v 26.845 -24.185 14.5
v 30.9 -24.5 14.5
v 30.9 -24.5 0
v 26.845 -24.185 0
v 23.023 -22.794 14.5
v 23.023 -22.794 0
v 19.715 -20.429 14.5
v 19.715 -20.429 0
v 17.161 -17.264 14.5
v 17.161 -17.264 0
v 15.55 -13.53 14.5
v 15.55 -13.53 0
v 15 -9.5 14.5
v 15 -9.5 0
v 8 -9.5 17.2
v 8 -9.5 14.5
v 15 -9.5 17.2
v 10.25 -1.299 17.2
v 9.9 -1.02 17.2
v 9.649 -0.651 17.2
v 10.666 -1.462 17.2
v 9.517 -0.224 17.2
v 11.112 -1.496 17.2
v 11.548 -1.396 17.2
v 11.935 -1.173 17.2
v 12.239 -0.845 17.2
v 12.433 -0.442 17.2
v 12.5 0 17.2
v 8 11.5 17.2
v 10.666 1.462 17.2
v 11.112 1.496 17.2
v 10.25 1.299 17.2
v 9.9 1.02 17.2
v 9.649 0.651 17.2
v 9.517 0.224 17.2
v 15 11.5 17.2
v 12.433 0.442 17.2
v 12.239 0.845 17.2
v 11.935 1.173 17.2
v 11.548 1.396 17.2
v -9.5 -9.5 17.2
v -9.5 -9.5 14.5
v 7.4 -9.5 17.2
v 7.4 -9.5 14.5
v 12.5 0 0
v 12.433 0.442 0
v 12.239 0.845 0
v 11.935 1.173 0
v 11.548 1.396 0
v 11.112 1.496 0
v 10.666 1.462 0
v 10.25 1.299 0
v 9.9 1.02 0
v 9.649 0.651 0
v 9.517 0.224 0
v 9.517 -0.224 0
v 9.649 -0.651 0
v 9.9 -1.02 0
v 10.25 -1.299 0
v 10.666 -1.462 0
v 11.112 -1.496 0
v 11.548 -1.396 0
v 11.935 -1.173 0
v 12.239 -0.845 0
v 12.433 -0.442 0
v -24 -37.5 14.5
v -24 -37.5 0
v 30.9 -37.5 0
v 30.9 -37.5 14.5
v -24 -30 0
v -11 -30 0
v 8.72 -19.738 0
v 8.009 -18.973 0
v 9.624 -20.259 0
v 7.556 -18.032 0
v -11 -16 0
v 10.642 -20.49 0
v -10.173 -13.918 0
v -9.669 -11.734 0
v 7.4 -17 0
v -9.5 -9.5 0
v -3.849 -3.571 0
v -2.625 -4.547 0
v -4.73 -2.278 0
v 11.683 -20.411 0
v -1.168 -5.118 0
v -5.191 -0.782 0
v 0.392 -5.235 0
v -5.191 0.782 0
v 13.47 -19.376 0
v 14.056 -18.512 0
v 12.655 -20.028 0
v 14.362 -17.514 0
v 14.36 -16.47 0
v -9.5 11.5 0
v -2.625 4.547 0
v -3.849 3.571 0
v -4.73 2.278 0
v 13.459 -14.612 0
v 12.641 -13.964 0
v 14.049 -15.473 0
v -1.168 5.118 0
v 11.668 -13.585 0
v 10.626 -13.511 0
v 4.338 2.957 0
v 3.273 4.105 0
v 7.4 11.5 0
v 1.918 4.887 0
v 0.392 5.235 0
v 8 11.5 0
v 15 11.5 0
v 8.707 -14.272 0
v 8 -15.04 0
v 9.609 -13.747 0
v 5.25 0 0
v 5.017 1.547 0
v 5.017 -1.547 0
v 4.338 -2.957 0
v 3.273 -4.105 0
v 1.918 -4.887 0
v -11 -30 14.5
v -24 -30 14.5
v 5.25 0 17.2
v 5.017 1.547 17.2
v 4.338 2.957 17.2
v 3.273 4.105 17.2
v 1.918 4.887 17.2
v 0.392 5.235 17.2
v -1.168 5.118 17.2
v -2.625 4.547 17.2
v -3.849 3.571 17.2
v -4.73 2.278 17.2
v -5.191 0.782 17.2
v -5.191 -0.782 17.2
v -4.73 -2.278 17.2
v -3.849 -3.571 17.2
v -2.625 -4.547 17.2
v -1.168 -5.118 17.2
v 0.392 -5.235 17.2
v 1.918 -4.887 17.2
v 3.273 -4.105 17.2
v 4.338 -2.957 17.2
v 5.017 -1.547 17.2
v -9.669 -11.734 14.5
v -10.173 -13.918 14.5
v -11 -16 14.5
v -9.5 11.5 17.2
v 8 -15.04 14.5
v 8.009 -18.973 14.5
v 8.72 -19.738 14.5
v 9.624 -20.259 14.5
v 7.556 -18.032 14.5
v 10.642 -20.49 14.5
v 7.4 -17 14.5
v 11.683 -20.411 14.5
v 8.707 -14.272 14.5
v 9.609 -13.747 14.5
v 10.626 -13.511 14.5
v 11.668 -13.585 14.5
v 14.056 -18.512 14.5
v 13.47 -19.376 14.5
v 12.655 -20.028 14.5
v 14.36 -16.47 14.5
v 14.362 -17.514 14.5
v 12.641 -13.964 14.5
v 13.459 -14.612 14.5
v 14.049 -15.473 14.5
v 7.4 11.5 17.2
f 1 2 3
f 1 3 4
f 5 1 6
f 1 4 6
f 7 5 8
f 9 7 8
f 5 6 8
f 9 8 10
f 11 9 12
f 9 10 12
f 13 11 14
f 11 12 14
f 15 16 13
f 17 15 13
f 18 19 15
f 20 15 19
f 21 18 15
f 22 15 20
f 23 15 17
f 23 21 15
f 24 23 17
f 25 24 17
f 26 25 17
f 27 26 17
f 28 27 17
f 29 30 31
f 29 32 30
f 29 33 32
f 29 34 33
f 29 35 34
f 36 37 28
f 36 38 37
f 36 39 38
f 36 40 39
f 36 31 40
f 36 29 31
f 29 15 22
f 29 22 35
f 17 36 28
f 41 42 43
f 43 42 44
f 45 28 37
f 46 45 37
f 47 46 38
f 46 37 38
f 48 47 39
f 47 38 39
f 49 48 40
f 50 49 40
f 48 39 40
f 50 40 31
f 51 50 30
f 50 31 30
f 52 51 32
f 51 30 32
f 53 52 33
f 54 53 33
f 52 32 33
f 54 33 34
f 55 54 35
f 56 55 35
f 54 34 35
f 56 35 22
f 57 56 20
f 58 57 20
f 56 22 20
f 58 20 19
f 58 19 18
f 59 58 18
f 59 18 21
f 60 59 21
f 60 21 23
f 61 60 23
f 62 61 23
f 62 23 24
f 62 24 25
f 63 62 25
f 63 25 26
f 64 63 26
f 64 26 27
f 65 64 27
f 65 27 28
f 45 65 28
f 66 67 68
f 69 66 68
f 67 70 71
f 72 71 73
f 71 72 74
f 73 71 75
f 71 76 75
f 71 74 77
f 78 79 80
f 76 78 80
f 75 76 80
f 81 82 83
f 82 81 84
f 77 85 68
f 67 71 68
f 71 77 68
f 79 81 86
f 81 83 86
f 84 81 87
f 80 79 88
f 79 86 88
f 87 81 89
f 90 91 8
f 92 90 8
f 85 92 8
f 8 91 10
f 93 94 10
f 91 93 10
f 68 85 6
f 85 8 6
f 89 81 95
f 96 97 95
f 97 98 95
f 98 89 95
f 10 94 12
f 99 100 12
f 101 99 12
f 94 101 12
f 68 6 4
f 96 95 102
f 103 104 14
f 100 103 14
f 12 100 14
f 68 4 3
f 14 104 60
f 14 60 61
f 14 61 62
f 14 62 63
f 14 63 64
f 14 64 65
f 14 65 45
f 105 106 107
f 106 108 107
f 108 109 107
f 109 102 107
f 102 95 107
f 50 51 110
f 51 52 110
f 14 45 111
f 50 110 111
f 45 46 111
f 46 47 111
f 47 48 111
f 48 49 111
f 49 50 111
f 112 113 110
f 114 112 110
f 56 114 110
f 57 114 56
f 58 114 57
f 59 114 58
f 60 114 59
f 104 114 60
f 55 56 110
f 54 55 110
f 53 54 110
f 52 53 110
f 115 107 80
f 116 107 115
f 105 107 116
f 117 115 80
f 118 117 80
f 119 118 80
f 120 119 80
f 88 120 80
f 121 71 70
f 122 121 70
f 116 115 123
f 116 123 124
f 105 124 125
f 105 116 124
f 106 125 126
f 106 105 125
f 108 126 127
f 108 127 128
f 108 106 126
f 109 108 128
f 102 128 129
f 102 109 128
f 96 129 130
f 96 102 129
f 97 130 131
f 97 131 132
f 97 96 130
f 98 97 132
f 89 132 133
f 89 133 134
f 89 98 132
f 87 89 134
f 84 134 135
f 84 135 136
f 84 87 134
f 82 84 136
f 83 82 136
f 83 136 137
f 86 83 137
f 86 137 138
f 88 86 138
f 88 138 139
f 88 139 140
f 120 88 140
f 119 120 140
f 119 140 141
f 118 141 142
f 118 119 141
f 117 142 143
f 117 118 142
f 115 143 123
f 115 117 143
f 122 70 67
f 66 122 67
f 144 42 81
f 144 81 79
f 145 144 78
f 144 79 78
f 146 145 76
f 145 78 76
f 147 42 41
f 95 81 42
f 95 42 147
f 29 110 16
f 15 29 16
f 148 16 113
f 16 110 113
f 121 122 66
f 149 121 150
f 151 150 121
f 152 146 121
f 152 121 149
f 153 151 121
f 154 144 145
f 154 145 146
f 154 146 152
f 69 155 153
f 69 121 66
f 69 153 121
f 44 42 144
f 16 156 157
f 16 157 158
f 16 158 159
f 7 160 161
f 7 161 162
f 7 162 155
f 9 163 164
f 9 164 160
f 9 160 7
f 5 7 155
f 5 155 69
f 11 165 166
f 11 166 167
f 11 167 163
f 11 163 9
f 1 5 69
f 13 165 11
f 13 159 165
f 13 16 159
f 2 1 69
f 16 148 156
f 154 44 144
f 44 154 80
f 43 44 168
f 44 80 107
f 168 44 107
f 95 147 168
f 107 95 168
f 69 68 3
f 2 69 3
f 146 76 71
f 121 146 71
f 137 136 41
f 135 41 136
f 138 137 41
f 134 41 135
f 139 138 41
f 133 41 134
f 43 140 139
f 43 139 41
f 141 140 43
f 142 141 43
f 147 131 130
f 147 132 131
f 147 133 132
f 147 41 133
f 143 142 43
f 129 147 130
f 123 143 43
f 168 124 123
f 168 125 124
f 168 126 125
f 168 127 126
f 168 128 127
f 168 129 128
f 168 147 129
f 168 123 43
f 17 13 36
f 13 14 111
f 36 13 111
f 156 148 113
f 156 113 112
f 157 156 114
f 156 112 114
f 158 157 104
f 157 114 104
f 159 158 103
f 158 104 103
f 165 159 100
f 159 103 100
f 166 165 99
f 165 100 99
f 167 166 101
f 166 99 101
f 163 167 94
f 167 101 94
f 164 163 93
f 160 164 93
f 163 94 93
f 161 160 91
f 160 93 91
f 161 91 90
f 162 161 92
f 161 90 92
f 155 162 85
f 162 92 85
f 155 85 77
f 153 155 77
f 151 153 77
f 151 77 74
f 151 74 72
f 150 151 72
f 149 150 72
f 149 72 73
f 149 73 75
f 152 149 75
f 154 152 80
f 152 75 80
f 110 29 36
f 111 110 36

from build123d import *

# Parameters (mm, degrees)
F1_DEPTH = 14.5
F0_W     = 16.9
F0_H     = 21
F0_R     = 5.25
F0_W_2   = 7
F2_DEPTH = 17.2
F3_R     = 1.5
F4_DEPTH = 25


with BuildPart() as f1:
    # F0 (on Top) → F1 (new body)
    with BuildSketch(Plane.XY):
        with BuildLine():
            Line((7.4, -9.5), (-9.5, -9.5))
            ThreePointArc((-9.5, -9.5), (-9.879864, -12.835416), (-11, -16))
            Line((-11, -16), (-11, -30))
            Line((-11, -30), (-24, -30))
            Line((-24, -30), (-24, -37.5))
            Line((-24, -37.5), (30.9, -37.5))
            Line((30.9, -37.5), (30.9, -24.5))
            ThreePointArc((30.9, -24.5), (19.714686, -20.429433), (15, -9.5))
            Line((15, -9.5), (8, -9.5))
            Line((8, -9.5), (8, -15.040408))
            ThreePointArc((8, -15.040408), (14.24664, -18.024695), (7.4, -17))
            Line((7.4, -17), (7.4, -9.5))
        make_face()
    extrude(amount=F1_DEPTH)

    # F0 (on Top) → F2 (join)
    with BuildSketch(Plane.XY):
        with Locations((-1.05, 1)):
            Rectangle(F0_W, F0_H)
        Circle(F0_R, mode=Mode.SUBTRACT)
        with Locations((11.5, 1)):
            Rectangle(F0_W_2, F0_H)
    extrude(amount=F2_DEPTH)

    # F3 (on face) → F4 (cut)
    with BuildSketch(Plane.XY.offset(17.2)):
        with Locations((11, 0)):
            Circle(F3_R)
    extrude(amount=-F4_DEPTH, mode=Mode.SUBTRACT)


solid = f1.part
